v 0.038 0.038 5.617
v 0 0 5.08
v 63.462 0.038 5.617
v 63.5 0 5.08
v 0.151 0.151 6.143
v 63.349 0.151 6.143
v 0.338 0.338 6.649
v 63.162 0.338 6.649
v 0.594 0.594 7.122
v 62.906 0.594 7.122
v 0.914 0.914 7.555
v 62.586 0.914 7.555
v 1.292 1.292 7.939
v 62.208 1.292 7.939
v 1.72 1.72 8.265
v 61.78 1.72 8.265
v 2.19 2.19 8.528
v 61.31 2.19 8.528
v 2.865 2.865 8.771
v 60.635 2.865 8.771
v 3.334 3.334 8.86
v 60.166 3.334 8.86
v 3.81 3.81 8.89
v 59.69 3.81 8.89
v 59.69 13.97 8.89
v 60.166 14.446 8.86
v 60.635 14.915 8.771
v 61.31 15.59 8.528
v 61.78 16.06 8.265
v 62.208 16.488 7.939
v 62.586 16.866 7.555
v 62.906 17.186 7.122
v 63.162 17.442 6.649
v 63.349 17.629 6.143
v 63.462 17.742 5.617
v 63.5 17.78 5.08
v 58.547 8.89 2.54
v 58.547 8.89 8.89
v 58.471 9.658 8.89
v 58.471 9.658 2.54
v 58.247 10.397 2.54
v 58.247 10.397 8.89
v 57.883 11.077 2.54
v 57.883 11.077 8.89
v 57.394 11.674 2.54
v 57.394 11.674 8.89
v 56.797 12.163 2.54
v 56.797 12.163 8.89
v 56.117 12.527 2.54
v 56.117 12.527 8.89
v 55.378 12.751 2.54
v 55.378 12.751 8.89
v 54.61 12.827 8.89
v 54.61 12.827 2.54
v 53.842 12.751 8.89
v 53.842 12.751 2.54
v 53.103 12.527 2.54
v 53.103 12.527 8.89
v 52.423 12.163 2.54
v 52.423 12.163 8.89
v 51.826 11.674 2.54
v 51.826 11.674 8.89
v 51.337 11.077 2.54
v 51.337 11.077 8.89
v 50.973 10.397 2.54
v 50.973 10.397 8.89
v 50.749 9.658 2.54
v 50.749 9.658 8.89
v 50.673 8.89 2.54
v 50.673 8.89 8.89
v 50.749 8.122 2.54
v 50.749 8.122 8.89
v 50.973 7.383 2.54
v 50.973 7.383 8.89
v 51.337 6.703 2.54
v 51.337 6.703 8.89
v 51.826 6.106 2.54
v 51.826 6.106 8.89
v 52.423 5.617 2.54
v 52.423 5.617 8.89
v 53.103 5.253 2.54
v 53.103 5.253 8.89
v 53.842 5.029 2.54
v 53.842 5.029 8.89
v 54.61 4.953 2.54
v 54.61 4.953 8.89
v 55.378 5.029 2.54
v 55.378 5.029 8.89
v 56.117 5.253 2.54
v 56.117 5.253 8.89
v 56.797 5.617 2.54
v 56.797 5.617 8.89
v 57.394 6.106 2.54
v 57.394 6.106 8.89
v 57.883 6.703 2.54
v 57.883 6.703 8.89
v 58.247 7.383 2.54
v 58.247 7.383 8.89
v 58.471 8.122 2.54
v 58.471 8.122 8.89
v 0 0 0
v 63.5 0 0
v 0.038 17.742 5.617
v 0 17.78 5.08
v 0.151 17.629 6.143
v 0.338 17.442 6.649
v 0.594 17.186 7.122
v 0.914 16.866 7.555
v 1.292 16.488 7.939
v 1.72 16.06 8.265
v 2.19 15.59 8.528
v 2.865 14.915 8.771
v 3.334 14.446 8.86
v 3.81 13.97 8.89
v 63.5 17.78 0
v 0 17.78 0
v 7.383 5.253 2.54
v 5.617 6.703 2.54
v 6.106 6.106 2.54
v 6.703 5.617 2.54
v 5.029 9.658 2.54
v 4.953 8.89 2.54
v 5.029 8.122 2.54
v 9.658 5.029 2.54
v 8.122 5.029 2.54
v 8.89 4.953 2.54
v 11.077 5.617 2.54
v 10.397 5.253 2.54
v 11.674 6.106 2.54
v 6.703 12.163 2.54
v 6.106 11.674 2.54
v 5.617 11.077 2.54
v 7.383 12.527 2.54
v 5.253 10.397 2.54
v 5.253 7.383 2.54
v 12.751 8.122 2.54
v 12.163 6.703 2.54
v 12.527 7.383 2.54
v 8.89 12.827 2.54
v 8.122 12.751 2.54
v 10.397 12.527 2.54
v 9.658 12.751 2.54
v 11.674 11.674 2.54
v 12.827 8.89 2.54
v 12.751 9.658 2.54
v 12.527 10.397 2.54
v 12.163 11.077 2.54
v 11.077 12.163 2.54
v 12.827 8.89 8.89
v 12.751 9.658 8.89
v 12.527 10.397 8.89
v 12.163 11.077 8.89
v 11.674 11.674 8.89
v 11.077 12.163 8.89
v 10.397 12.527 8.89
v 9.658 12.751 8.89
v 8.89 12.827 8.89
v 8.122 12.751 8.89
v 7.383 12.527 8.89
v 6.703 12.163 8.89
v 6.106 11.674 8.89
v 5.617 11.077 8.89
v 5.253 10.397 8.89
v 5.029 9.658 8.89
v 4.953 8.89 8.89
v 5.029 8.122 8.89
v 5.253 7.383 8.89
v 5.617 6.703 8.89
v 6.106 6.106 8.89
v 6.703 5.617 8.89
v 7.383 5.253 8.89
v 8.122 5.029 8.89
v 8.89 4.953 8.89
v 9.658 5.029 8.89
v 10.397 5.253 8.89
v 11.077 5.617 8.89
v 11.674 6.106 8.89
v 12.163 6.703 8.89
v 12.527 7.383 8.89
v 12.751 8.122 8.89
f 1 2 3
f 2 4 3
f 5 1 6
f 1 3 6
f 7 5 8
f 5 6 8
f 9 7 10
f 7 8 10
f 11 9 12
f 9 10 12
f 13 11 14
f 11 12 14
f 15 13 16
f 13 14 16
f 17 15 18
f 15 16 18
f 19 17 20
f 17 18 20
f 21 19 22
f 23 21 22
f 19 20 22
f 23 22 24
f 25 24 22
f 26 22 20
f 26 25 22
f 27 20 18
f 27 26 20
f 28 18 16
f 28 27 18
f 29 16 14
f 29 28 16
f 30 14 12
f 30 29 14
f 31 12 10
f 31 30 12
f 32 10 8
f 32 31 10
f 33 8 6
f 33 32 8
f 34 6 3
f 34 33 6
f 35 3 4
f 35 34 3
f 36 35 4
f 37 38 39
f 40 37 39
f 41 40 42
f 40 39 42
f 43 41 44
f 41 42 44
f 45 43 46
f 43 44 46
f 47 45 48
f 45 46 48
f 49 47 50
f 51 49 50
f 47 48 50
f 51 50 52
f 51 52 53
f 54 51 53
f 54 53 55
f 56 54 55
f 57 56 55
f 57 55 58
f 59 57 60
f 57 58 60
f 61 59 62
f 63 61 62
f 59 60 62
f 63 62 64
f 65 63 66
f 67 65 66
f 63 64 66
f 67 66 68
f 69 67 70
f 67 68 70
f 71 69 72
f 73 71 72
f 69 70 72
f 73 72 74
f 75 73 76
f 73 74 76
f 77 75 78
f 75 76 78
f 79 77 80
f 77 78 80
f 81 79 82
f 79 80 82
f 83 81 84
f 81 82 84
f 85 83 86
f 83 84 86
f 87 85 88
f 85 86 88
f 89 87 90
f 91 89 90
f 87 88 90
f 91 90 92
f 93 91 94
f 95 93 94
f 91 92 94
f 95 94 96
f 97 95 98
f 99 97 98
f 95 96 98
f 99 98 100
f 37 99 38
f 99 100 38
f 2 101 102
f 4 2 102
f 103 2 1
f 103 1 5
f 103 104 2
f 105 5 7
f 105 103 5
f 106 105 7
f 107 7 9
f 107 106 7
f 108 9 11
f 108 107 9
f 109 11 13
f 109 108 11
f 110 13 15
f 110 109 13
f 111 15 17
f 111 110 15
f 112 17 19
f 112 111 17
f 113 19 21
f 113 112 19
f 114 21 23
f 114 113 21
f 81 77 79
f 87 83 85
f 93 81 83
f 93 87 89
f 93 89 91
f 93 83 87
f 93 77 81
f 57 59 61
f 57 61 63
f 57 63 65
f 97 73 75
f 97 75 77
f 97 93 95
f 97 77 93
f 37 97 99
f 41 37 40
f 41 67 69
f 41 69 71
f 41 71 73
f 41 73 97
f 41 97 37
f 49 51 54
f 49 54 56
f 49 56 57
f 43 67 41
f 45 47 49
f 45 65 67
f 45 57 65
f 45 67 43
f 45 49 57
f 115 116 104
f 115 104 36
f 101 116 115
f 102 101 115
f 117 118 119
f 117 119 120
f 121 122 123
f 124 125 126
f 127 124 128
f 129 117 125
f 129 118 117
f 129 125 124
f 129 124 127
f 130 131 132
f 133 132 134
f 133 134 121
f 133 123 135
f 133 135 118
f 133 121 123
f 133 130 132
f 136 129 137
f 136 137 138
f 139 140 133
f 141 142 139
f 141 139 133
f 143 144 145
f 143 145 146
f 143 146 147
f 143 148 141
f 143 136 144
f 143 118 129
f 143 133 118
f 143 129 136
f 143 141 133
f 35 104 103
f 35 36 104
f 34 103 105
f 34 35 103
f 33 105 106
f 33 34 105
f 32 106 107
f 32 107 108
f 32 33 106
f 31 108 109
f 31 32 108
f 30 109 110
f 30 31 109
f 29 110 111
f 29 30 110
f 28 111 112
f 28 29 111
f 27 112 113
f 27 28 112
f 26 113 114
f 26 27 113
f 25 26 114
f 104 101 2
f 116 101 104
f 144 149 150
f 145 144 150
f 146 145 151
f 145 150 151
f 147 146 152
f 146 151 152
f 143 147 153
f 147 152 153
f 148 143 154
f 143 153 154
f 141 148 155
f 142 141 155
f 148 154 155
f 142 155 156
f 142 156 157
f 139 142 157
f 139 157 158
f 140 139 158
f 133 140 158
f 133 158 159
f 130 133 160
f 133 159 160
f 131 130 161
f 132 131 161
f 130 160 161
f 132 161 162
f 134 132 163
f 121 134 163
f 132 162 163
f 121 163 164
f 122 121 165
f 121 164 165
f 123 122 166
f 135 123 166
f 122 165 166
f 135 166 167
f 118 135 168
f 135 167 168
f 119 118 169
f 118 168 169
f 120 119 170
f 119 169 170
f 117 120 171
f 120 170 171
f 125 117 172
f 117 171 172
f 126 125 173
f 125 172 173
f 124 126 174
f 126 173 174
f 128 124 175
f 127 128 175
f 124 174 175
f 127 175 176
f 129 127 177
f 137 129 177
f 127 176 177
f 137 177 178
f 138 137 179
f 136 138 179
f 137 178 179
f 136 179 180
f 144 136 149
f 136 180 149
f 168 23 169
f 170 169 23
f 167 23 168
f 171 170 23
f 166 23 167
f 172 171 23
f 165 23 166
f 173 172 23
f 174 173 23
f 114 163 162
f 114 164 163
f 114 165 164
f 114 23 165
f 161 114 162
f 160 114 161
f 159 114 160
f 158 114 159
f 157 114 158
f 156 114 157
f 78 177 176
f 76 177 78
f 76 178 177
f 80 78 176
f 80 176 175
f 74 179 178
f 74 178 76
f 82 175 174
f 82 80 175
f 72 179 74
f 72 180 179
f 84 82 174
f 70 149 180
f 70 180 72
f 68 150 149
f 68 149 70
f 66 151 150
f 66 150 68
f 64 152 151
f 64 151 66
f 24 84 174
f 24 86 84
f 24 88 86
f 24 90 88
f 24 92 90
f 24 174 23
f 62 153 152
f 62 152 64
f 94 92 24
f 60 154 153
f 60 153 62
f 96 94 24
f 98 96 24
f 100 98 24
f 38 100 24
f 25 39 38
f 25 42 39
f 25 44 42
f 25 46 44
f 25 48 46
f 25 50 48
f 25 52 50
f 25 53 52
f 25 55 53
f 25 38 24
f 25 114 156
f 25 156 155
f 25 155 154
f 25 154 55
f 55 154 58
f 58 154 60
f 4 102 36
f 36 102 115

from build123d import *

# Parameters (mm, degrees)
F0_W     = 63.5
F0_H     = 17.78
F1_DEPTH = 8.89
F2_R     = 3.937
F3_DEPTH = 6.35
F4_R     = 3.81


with BuildPart() as f1:
    # F0 (on Top) → F1 (new body)
    with BuildSketch(Plane.XY):
        with Locations((31.75, 8.89)):
            Rectangle(F0_W, F0_H)
    extrude(amount=F1_DEPTH)

    # F2 (on face) → F3 (cut)
    with BuildSketch(Plane.XY.offset(8.89)):
        with Locations((8.89, 8.89)):
            Circle(F2_R)
        with Locations((54.61, 8.89)):
            Circle(F2_R)
    extrude(amount=-F3_DEPTH, mode=Mode.SUBTRACT)

    # F4
    f4_edges = [f1.edges().sort_by_distance(p)[0] for p in [
        (31.75, 0, 8.89),
        (0, 8.89, 8.89),
        (31.75, 17.78, 8.89),
        (63.5, 8.89, 8.89),
    ]]
    fillet(f4_edges, radius=F4_R)


solid = f1.part
